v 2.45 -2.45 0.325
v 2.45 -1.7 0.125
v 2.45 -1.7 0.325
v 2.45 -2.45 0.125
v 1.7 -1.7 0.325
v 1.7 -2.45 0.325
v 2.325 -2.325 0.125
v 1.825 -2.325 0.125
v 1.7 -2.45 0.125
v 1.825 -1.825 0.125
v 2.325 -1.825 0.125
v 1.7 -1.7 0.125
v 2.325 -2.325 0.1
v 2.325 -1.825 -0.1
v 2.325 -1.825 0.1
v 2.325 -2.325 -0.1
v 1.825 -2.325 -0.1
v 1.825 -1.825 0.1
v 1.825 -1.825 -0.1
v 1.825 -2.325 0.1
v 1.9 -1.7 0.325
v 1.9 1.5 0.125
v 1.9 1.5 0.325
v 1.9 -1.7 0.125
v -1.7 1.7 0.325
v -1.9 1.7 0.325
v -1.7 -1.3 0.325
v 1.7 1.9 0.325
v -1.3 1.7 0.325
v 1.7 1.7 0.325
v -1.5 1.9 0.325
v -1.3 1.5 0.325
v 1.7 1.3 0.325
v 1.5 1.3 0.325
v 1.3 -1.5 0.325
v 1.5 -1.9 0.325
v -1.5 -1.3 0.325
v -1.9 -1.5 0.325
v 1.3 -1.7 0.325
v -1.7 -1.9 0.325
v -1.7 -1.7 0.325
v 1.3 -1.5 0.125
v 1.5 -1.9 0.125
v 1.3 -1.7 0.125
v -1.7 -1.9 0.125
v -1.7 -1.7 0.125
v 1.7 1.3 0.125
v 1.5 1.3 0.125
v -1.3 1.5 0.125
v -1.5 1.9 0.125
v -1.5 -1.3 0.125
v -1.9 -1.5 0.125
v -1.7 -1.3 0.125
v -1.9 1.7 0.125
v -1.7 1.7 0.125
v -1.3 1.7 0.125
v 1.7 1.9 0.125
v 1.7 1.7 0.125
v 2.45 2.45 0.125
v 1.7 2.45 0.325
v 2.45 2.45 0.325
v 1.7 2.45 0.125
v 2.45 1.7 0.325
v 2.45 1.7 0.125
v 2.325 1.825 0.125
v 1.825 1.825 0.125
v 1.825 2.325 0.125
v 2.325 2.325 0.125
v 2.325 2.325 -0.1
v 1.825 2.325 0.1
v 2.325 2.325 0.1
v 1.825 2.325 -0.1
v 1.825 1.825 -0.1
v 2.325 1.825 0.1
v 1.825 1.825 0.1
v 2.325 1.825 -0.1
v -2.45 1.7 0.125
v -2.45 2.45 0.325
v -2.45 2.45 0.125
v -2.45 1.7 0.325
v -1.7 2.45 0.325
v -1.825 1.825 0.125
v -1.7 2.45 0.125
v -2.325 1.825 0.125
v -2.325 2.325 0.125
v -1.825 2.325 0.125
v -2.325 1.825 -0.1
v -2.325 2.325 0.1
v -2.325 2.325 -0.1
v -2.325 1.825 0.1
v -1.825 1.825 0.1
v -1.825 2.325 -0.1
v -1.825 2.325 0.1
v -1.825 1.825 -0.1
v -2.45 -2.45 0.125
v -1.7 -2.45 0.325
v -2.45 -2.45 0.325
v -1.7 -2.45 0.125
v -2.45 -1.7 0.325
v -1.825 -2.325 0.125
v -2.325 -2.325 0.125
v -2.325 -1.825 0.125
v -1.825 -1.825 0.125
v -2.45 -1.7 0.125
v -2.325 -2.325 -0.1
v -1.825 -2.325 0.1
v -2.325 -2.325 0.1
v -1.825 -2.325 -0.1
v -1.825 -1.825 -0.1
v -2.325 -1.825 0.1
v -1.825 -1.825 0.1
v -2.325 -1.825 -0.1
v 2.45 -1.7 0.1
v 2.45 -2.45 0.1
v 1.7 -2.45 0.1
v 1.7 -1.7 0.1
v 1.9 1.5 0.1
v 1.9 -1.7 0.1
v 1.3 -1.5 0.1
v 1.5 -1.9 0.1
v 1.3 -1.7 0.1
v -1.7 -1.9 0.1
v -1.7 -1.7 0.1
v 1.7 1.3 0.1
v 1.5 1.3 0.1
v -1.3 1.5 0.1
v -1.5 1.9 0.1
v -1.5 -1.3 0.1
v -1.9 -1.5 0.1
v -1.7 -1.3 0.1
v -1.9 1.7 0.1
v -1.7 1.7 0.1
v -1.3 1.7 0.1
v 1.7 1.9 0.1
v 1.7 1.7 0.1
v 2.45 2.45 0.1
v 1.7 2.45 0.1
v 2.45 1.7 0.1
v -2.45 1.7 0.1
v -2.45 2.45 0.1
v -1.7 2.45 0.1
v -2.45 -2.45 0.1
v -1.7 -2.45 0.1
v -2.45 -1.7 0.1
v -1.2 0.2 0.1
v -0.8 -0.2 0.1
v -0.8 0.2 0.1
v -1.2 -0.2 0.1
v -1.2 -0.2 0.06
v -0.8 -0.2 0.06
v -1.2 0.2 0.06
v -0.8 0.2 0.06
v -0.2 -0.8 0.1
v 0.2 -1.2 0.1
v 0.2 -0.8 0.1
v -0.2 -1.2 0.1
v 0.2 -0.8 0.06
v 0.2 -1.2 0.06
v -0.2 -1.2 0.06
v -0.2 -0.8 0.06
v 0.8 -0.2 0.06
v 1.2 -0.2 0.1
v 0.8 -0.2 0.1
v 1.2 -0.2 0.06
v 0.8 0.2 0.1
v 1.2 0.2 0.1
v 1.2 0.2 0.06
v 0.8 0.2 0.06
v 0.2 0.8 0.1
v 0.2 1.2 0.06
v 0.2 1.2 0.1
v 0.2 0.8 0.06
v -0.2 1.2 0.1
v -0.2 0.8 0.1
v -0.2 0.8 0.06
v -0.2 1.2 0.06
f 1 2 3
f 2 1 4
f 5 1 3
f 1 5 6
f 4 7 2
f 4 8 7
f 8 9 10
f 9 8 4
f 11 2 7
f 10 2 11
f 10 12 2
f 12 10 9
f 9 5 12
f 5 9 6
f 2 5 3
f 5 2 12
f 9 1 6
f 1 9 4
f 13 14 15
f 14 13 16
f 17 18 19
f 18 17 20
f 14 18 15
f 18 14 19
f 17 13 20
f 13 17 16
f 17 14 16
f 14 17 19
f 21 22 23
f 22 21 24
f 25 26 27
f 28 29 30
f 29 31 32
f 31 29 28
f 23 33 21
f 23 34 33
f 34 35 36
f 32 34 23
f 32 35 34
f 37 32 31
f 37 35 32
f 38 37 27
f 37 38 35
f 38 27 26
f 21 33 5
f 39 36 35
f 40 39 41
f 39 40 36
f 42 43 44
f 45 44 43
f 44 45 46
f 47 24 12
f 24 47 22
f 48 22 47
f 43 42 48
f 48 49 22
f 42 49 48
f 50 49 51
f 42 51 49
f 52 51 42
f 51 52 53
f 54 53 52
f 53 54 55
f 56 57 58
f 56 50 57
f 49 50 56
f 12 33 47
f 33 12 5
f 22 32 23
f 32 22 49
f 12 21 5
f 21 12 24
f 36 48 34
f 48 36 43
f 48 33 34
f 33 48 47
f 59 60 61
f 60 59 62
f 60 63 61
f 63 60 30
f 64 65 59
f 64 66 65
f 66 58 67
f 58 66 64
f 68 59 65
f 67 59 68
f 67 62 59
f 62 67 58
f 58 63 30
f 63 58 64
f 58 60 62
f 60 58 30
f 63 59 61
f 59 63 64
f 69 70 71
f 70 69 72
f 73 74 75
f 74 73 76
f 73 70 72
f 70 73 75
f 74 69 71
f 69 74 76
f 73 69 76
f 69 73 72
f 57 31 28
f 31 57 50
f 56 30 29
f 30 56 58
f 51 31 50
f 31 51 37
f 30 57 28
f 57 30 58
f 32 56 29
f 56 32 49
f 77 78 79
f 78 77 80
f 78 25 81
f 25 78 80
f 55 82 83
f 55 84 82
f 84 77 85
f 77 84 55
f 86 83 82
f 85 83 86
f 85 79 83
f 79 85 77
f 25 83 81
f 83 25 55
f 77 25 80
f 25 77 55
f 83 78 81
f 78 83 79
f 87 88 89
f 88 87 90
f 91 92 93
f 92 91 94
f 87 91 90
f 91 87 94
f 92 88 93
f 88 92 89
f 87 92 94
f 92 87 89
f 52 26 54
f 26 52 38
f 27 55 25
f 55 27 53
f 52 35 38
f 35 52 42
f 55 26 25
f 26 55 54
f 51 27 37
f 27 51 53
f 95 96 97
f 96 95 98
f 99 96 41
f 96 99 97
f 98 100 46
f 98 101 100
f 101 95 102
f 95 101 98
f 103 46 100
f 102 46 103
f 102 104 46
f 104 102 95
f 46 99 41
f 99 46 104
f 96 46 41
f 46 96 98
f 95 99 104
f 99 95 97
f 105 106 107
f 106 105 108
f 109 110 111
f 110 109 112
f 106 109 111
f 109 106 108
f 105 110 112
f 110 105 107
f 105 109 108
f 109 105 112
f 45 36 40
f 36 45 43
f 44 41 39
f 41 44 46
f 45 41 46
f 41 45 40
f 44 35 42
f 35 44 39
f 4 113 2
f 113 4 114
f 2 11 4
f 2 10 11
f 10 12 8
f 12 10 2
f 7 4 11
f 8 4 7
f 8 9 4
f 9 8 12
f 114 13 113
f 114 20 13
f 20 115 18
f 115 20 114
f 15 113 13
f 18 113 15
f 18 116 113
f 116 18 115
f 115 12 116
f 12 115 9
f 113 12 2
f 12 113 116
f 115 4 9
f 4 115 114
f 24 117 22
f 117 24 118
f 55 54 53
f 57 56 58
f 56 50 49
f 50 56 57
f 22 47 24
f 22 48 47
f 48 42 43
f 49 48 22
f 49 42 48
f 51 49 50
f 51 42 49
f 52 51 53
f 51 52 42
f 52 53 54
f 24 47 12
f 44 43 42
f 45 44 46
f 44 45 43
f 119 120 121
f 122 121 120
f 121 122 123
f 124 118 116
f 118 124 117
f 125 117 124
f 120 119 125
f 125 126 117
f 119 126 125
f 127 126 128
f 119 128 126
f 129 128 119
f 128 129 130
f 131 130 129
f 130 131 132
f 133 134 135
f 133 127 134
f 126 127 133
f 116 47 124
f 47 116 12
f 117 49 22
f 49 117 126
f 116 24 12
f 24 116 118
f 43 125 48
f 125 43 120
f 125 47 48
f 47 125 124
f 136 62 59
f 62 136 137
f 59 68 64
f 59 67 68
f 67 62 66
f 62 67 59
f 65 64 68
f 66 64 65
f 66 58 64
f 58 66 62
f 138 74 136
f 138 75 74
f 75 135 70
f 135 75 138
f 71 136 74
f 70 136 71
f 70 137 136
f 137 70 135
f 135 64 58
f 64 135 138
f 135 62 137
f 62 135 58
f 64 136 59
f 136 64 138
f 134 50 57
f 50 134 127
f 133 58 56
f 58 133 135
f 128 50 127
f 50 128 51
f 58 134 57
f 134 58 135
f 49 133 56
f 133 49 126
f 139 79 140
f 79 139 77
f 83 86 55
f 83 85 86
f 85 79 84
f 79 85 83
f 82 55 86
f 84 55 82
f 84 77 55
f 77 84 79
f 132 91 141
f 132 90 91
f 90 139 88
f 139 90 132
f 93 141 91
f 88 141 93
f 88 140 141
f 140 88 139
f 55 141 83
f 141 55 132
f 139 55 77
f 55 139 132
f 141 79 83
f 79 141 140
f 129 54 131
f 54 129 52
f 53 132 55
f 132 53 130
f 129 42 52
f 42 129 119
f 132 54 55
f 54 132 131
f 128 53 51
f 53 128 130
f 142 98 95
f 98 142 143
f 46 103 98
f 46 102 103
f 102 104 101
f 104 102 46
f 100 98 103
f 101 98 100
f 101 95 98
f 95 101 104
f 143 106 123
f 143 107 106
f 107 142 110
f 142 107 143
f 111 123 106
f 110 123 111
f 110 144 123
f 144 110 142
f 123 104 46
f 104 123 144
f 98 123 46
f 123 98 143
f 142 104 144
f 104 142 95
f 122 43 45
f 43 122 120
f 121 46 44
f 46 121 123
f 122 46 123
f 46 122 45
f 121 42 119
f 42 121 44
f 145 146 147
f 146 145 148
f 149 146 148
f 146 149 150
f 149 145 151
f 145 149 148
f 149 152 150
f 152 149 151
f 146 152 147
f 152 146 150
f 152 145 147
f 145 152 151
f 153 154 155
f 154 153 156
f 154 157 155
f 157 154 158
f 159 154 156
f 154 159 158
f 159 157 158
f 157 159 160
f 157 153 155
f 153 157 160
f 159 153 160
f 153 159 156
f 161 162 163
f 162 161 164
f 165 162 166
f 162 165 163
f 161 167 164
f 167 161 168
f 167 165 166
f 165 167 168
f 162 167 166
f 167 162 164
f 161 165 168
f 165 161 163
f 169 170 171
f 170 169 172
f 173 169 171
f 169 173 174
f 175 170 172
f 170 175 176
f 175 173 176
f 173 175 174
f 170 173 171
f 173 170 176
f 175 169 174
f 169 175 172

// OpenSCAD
// Stanford NEM Relay CAD Model
// Author: Akash Levy

// RELAY PARAMETERS (lengths are in units of um)
g_act = 0.1;                // actuation gap: gap between c

t_poly = 0.2;               // thickness of poly-SiGe layer
L_plate = 3;                // side length of parallel plate

L_cant = L_plate;           // length of cantilever
W_cant = 0.2;               // width of cantilever
g_cant = W_cant;            // gap between plate and cantilever

L_via = 0.5;                // side length of via
L_anc = L_via + 0.25;       // side length of anchor attachment

n_cont = 4;                 // number of contacts
L_cont = 0.4;               // side length of contact
r_cont = 1;                 // radius of circle along which to place contacts
t_cont = 0.04;              // thickness of contact

t_sub = 0.1;                // substrate thickness

t_sp = 0.025;               // thickness of spacer

// RENDERING OPTIONS
poly_on = 1;
spacer_on = 1;
via_on = 1;
contact_on = 1;
substrate_on = 0;
scale_factor = 1;

//projection()
scale(scale_factor)
union () {
    // POLY LAYER AND VIA LAYER
    translate([0, 0, t_poly/2 + g_act + t_sp]) {
        // Plate
        if (poly_on)
        cube([L_plate, L_plate, t_poly], center=true);

        // Arms and attachments
        for(i=[0:3]) {
            rotate([0, 0, 90*i]) {
                // Cantilever
                if (poly_on)
                translate([L_cant/2 + g_cant + W_cant/2, -W_cant/2, 0])
                cube([W_cant, L_plate + W_cant, t_poly], center=true);
                
                // Cantilever attachment
                if (poly_on)
                translate([L_plate/2 + g_cant/2, L_plate/2 - W_cant/2, 0])
                cube([g_cant, W_cant, t_poly], center=true);
                
                // Anchors (attachments + vias)
                translate([L_plate/2 + g_cant + L_anc/2, -L_plate/2 - L_anc/2 - W_cant, 0]) {
                    // Attachments (anchors - vias)
                    if (poly_on)
                    difference() {
                        cube([L_anc, L_anc, t_poly], center=true);
                        translate([0, 0, -t_sub/2 - g_act/2])
                        cube([L_via, L_via, t_poly + g_act + t_sub + 0.1], center=true);
                    }
                        
                    // Vias
                    if (via_on)
                    color([1, 0, 0])
                    translate([0, 0, -t_sub/2 - g_act/2 - t_sp/2])
                    cube([L_via, L_via, t_poly + g_act + t_sub + t_sp], center=true);
                }
            }
        }
    }

    // INSULATING LAYER
    // TODO: use modules for insulating layer since same as poly layer pretty much
    if (spacer_on)
    color([0,1,0])
    translate([0, 0, g_act + t_sp/2]) {
        // Plate
        cube([L_plate, L_plate, t_sp], center=true);

        // Arms and attachments
        for(i=[0:3]) {
            rotate([0, 0, 90*i]) {
                // Cantilever
                translate([L_plate/2 + g_cant + W_cant/2, -W_cant/2, 0])
                cube([W_cant, L_plate + W_cant, t_sp], center=true);
                
                // Cantilever attachment
                translate([L_plate/2 + g_cant/2, L_plate/2 - W_cant/2, 0])
                cube([g_cant, W_cant, t_sp], center=true);
                
                // Anchors (attachments + vias)
                translate([L_plate/2 + g_cant + L_anc/2, -L_plate/2 - L_anc/2 - W_cant, 0]) {
                    // Attachments (anchors - vias)
                    difference() {
                        cube([L_anc, L_anc, t_sp], center=true);
                        translate([0, 0, -t_sub/2 - g_act/2])
                        cube([L_via, L_via, t_poly + g_act + t_sub + 0.1], center=true);
                    }
                }
            }
        }
    }

    // CONTACT LAYER
    if (contact_on)
    for(i=[1:n_cont]) {
        rotate([0, 0, 360/n_cont*i])
        translate([0, r_cont, g_act - t_cont/2])
        color([0.5, 0, 0.5])
        cube([L_cont, L_cont, t_cont], center=true);
    }

    // SUBSTRATE LAYER
    if (substrate_on)
    color([0.5,0.5,0.5])
    translate([0, 0, -t_sub/2]) {
        cube([L_plate*3, L_plate*3, t_sub], center=true);
    }
}
